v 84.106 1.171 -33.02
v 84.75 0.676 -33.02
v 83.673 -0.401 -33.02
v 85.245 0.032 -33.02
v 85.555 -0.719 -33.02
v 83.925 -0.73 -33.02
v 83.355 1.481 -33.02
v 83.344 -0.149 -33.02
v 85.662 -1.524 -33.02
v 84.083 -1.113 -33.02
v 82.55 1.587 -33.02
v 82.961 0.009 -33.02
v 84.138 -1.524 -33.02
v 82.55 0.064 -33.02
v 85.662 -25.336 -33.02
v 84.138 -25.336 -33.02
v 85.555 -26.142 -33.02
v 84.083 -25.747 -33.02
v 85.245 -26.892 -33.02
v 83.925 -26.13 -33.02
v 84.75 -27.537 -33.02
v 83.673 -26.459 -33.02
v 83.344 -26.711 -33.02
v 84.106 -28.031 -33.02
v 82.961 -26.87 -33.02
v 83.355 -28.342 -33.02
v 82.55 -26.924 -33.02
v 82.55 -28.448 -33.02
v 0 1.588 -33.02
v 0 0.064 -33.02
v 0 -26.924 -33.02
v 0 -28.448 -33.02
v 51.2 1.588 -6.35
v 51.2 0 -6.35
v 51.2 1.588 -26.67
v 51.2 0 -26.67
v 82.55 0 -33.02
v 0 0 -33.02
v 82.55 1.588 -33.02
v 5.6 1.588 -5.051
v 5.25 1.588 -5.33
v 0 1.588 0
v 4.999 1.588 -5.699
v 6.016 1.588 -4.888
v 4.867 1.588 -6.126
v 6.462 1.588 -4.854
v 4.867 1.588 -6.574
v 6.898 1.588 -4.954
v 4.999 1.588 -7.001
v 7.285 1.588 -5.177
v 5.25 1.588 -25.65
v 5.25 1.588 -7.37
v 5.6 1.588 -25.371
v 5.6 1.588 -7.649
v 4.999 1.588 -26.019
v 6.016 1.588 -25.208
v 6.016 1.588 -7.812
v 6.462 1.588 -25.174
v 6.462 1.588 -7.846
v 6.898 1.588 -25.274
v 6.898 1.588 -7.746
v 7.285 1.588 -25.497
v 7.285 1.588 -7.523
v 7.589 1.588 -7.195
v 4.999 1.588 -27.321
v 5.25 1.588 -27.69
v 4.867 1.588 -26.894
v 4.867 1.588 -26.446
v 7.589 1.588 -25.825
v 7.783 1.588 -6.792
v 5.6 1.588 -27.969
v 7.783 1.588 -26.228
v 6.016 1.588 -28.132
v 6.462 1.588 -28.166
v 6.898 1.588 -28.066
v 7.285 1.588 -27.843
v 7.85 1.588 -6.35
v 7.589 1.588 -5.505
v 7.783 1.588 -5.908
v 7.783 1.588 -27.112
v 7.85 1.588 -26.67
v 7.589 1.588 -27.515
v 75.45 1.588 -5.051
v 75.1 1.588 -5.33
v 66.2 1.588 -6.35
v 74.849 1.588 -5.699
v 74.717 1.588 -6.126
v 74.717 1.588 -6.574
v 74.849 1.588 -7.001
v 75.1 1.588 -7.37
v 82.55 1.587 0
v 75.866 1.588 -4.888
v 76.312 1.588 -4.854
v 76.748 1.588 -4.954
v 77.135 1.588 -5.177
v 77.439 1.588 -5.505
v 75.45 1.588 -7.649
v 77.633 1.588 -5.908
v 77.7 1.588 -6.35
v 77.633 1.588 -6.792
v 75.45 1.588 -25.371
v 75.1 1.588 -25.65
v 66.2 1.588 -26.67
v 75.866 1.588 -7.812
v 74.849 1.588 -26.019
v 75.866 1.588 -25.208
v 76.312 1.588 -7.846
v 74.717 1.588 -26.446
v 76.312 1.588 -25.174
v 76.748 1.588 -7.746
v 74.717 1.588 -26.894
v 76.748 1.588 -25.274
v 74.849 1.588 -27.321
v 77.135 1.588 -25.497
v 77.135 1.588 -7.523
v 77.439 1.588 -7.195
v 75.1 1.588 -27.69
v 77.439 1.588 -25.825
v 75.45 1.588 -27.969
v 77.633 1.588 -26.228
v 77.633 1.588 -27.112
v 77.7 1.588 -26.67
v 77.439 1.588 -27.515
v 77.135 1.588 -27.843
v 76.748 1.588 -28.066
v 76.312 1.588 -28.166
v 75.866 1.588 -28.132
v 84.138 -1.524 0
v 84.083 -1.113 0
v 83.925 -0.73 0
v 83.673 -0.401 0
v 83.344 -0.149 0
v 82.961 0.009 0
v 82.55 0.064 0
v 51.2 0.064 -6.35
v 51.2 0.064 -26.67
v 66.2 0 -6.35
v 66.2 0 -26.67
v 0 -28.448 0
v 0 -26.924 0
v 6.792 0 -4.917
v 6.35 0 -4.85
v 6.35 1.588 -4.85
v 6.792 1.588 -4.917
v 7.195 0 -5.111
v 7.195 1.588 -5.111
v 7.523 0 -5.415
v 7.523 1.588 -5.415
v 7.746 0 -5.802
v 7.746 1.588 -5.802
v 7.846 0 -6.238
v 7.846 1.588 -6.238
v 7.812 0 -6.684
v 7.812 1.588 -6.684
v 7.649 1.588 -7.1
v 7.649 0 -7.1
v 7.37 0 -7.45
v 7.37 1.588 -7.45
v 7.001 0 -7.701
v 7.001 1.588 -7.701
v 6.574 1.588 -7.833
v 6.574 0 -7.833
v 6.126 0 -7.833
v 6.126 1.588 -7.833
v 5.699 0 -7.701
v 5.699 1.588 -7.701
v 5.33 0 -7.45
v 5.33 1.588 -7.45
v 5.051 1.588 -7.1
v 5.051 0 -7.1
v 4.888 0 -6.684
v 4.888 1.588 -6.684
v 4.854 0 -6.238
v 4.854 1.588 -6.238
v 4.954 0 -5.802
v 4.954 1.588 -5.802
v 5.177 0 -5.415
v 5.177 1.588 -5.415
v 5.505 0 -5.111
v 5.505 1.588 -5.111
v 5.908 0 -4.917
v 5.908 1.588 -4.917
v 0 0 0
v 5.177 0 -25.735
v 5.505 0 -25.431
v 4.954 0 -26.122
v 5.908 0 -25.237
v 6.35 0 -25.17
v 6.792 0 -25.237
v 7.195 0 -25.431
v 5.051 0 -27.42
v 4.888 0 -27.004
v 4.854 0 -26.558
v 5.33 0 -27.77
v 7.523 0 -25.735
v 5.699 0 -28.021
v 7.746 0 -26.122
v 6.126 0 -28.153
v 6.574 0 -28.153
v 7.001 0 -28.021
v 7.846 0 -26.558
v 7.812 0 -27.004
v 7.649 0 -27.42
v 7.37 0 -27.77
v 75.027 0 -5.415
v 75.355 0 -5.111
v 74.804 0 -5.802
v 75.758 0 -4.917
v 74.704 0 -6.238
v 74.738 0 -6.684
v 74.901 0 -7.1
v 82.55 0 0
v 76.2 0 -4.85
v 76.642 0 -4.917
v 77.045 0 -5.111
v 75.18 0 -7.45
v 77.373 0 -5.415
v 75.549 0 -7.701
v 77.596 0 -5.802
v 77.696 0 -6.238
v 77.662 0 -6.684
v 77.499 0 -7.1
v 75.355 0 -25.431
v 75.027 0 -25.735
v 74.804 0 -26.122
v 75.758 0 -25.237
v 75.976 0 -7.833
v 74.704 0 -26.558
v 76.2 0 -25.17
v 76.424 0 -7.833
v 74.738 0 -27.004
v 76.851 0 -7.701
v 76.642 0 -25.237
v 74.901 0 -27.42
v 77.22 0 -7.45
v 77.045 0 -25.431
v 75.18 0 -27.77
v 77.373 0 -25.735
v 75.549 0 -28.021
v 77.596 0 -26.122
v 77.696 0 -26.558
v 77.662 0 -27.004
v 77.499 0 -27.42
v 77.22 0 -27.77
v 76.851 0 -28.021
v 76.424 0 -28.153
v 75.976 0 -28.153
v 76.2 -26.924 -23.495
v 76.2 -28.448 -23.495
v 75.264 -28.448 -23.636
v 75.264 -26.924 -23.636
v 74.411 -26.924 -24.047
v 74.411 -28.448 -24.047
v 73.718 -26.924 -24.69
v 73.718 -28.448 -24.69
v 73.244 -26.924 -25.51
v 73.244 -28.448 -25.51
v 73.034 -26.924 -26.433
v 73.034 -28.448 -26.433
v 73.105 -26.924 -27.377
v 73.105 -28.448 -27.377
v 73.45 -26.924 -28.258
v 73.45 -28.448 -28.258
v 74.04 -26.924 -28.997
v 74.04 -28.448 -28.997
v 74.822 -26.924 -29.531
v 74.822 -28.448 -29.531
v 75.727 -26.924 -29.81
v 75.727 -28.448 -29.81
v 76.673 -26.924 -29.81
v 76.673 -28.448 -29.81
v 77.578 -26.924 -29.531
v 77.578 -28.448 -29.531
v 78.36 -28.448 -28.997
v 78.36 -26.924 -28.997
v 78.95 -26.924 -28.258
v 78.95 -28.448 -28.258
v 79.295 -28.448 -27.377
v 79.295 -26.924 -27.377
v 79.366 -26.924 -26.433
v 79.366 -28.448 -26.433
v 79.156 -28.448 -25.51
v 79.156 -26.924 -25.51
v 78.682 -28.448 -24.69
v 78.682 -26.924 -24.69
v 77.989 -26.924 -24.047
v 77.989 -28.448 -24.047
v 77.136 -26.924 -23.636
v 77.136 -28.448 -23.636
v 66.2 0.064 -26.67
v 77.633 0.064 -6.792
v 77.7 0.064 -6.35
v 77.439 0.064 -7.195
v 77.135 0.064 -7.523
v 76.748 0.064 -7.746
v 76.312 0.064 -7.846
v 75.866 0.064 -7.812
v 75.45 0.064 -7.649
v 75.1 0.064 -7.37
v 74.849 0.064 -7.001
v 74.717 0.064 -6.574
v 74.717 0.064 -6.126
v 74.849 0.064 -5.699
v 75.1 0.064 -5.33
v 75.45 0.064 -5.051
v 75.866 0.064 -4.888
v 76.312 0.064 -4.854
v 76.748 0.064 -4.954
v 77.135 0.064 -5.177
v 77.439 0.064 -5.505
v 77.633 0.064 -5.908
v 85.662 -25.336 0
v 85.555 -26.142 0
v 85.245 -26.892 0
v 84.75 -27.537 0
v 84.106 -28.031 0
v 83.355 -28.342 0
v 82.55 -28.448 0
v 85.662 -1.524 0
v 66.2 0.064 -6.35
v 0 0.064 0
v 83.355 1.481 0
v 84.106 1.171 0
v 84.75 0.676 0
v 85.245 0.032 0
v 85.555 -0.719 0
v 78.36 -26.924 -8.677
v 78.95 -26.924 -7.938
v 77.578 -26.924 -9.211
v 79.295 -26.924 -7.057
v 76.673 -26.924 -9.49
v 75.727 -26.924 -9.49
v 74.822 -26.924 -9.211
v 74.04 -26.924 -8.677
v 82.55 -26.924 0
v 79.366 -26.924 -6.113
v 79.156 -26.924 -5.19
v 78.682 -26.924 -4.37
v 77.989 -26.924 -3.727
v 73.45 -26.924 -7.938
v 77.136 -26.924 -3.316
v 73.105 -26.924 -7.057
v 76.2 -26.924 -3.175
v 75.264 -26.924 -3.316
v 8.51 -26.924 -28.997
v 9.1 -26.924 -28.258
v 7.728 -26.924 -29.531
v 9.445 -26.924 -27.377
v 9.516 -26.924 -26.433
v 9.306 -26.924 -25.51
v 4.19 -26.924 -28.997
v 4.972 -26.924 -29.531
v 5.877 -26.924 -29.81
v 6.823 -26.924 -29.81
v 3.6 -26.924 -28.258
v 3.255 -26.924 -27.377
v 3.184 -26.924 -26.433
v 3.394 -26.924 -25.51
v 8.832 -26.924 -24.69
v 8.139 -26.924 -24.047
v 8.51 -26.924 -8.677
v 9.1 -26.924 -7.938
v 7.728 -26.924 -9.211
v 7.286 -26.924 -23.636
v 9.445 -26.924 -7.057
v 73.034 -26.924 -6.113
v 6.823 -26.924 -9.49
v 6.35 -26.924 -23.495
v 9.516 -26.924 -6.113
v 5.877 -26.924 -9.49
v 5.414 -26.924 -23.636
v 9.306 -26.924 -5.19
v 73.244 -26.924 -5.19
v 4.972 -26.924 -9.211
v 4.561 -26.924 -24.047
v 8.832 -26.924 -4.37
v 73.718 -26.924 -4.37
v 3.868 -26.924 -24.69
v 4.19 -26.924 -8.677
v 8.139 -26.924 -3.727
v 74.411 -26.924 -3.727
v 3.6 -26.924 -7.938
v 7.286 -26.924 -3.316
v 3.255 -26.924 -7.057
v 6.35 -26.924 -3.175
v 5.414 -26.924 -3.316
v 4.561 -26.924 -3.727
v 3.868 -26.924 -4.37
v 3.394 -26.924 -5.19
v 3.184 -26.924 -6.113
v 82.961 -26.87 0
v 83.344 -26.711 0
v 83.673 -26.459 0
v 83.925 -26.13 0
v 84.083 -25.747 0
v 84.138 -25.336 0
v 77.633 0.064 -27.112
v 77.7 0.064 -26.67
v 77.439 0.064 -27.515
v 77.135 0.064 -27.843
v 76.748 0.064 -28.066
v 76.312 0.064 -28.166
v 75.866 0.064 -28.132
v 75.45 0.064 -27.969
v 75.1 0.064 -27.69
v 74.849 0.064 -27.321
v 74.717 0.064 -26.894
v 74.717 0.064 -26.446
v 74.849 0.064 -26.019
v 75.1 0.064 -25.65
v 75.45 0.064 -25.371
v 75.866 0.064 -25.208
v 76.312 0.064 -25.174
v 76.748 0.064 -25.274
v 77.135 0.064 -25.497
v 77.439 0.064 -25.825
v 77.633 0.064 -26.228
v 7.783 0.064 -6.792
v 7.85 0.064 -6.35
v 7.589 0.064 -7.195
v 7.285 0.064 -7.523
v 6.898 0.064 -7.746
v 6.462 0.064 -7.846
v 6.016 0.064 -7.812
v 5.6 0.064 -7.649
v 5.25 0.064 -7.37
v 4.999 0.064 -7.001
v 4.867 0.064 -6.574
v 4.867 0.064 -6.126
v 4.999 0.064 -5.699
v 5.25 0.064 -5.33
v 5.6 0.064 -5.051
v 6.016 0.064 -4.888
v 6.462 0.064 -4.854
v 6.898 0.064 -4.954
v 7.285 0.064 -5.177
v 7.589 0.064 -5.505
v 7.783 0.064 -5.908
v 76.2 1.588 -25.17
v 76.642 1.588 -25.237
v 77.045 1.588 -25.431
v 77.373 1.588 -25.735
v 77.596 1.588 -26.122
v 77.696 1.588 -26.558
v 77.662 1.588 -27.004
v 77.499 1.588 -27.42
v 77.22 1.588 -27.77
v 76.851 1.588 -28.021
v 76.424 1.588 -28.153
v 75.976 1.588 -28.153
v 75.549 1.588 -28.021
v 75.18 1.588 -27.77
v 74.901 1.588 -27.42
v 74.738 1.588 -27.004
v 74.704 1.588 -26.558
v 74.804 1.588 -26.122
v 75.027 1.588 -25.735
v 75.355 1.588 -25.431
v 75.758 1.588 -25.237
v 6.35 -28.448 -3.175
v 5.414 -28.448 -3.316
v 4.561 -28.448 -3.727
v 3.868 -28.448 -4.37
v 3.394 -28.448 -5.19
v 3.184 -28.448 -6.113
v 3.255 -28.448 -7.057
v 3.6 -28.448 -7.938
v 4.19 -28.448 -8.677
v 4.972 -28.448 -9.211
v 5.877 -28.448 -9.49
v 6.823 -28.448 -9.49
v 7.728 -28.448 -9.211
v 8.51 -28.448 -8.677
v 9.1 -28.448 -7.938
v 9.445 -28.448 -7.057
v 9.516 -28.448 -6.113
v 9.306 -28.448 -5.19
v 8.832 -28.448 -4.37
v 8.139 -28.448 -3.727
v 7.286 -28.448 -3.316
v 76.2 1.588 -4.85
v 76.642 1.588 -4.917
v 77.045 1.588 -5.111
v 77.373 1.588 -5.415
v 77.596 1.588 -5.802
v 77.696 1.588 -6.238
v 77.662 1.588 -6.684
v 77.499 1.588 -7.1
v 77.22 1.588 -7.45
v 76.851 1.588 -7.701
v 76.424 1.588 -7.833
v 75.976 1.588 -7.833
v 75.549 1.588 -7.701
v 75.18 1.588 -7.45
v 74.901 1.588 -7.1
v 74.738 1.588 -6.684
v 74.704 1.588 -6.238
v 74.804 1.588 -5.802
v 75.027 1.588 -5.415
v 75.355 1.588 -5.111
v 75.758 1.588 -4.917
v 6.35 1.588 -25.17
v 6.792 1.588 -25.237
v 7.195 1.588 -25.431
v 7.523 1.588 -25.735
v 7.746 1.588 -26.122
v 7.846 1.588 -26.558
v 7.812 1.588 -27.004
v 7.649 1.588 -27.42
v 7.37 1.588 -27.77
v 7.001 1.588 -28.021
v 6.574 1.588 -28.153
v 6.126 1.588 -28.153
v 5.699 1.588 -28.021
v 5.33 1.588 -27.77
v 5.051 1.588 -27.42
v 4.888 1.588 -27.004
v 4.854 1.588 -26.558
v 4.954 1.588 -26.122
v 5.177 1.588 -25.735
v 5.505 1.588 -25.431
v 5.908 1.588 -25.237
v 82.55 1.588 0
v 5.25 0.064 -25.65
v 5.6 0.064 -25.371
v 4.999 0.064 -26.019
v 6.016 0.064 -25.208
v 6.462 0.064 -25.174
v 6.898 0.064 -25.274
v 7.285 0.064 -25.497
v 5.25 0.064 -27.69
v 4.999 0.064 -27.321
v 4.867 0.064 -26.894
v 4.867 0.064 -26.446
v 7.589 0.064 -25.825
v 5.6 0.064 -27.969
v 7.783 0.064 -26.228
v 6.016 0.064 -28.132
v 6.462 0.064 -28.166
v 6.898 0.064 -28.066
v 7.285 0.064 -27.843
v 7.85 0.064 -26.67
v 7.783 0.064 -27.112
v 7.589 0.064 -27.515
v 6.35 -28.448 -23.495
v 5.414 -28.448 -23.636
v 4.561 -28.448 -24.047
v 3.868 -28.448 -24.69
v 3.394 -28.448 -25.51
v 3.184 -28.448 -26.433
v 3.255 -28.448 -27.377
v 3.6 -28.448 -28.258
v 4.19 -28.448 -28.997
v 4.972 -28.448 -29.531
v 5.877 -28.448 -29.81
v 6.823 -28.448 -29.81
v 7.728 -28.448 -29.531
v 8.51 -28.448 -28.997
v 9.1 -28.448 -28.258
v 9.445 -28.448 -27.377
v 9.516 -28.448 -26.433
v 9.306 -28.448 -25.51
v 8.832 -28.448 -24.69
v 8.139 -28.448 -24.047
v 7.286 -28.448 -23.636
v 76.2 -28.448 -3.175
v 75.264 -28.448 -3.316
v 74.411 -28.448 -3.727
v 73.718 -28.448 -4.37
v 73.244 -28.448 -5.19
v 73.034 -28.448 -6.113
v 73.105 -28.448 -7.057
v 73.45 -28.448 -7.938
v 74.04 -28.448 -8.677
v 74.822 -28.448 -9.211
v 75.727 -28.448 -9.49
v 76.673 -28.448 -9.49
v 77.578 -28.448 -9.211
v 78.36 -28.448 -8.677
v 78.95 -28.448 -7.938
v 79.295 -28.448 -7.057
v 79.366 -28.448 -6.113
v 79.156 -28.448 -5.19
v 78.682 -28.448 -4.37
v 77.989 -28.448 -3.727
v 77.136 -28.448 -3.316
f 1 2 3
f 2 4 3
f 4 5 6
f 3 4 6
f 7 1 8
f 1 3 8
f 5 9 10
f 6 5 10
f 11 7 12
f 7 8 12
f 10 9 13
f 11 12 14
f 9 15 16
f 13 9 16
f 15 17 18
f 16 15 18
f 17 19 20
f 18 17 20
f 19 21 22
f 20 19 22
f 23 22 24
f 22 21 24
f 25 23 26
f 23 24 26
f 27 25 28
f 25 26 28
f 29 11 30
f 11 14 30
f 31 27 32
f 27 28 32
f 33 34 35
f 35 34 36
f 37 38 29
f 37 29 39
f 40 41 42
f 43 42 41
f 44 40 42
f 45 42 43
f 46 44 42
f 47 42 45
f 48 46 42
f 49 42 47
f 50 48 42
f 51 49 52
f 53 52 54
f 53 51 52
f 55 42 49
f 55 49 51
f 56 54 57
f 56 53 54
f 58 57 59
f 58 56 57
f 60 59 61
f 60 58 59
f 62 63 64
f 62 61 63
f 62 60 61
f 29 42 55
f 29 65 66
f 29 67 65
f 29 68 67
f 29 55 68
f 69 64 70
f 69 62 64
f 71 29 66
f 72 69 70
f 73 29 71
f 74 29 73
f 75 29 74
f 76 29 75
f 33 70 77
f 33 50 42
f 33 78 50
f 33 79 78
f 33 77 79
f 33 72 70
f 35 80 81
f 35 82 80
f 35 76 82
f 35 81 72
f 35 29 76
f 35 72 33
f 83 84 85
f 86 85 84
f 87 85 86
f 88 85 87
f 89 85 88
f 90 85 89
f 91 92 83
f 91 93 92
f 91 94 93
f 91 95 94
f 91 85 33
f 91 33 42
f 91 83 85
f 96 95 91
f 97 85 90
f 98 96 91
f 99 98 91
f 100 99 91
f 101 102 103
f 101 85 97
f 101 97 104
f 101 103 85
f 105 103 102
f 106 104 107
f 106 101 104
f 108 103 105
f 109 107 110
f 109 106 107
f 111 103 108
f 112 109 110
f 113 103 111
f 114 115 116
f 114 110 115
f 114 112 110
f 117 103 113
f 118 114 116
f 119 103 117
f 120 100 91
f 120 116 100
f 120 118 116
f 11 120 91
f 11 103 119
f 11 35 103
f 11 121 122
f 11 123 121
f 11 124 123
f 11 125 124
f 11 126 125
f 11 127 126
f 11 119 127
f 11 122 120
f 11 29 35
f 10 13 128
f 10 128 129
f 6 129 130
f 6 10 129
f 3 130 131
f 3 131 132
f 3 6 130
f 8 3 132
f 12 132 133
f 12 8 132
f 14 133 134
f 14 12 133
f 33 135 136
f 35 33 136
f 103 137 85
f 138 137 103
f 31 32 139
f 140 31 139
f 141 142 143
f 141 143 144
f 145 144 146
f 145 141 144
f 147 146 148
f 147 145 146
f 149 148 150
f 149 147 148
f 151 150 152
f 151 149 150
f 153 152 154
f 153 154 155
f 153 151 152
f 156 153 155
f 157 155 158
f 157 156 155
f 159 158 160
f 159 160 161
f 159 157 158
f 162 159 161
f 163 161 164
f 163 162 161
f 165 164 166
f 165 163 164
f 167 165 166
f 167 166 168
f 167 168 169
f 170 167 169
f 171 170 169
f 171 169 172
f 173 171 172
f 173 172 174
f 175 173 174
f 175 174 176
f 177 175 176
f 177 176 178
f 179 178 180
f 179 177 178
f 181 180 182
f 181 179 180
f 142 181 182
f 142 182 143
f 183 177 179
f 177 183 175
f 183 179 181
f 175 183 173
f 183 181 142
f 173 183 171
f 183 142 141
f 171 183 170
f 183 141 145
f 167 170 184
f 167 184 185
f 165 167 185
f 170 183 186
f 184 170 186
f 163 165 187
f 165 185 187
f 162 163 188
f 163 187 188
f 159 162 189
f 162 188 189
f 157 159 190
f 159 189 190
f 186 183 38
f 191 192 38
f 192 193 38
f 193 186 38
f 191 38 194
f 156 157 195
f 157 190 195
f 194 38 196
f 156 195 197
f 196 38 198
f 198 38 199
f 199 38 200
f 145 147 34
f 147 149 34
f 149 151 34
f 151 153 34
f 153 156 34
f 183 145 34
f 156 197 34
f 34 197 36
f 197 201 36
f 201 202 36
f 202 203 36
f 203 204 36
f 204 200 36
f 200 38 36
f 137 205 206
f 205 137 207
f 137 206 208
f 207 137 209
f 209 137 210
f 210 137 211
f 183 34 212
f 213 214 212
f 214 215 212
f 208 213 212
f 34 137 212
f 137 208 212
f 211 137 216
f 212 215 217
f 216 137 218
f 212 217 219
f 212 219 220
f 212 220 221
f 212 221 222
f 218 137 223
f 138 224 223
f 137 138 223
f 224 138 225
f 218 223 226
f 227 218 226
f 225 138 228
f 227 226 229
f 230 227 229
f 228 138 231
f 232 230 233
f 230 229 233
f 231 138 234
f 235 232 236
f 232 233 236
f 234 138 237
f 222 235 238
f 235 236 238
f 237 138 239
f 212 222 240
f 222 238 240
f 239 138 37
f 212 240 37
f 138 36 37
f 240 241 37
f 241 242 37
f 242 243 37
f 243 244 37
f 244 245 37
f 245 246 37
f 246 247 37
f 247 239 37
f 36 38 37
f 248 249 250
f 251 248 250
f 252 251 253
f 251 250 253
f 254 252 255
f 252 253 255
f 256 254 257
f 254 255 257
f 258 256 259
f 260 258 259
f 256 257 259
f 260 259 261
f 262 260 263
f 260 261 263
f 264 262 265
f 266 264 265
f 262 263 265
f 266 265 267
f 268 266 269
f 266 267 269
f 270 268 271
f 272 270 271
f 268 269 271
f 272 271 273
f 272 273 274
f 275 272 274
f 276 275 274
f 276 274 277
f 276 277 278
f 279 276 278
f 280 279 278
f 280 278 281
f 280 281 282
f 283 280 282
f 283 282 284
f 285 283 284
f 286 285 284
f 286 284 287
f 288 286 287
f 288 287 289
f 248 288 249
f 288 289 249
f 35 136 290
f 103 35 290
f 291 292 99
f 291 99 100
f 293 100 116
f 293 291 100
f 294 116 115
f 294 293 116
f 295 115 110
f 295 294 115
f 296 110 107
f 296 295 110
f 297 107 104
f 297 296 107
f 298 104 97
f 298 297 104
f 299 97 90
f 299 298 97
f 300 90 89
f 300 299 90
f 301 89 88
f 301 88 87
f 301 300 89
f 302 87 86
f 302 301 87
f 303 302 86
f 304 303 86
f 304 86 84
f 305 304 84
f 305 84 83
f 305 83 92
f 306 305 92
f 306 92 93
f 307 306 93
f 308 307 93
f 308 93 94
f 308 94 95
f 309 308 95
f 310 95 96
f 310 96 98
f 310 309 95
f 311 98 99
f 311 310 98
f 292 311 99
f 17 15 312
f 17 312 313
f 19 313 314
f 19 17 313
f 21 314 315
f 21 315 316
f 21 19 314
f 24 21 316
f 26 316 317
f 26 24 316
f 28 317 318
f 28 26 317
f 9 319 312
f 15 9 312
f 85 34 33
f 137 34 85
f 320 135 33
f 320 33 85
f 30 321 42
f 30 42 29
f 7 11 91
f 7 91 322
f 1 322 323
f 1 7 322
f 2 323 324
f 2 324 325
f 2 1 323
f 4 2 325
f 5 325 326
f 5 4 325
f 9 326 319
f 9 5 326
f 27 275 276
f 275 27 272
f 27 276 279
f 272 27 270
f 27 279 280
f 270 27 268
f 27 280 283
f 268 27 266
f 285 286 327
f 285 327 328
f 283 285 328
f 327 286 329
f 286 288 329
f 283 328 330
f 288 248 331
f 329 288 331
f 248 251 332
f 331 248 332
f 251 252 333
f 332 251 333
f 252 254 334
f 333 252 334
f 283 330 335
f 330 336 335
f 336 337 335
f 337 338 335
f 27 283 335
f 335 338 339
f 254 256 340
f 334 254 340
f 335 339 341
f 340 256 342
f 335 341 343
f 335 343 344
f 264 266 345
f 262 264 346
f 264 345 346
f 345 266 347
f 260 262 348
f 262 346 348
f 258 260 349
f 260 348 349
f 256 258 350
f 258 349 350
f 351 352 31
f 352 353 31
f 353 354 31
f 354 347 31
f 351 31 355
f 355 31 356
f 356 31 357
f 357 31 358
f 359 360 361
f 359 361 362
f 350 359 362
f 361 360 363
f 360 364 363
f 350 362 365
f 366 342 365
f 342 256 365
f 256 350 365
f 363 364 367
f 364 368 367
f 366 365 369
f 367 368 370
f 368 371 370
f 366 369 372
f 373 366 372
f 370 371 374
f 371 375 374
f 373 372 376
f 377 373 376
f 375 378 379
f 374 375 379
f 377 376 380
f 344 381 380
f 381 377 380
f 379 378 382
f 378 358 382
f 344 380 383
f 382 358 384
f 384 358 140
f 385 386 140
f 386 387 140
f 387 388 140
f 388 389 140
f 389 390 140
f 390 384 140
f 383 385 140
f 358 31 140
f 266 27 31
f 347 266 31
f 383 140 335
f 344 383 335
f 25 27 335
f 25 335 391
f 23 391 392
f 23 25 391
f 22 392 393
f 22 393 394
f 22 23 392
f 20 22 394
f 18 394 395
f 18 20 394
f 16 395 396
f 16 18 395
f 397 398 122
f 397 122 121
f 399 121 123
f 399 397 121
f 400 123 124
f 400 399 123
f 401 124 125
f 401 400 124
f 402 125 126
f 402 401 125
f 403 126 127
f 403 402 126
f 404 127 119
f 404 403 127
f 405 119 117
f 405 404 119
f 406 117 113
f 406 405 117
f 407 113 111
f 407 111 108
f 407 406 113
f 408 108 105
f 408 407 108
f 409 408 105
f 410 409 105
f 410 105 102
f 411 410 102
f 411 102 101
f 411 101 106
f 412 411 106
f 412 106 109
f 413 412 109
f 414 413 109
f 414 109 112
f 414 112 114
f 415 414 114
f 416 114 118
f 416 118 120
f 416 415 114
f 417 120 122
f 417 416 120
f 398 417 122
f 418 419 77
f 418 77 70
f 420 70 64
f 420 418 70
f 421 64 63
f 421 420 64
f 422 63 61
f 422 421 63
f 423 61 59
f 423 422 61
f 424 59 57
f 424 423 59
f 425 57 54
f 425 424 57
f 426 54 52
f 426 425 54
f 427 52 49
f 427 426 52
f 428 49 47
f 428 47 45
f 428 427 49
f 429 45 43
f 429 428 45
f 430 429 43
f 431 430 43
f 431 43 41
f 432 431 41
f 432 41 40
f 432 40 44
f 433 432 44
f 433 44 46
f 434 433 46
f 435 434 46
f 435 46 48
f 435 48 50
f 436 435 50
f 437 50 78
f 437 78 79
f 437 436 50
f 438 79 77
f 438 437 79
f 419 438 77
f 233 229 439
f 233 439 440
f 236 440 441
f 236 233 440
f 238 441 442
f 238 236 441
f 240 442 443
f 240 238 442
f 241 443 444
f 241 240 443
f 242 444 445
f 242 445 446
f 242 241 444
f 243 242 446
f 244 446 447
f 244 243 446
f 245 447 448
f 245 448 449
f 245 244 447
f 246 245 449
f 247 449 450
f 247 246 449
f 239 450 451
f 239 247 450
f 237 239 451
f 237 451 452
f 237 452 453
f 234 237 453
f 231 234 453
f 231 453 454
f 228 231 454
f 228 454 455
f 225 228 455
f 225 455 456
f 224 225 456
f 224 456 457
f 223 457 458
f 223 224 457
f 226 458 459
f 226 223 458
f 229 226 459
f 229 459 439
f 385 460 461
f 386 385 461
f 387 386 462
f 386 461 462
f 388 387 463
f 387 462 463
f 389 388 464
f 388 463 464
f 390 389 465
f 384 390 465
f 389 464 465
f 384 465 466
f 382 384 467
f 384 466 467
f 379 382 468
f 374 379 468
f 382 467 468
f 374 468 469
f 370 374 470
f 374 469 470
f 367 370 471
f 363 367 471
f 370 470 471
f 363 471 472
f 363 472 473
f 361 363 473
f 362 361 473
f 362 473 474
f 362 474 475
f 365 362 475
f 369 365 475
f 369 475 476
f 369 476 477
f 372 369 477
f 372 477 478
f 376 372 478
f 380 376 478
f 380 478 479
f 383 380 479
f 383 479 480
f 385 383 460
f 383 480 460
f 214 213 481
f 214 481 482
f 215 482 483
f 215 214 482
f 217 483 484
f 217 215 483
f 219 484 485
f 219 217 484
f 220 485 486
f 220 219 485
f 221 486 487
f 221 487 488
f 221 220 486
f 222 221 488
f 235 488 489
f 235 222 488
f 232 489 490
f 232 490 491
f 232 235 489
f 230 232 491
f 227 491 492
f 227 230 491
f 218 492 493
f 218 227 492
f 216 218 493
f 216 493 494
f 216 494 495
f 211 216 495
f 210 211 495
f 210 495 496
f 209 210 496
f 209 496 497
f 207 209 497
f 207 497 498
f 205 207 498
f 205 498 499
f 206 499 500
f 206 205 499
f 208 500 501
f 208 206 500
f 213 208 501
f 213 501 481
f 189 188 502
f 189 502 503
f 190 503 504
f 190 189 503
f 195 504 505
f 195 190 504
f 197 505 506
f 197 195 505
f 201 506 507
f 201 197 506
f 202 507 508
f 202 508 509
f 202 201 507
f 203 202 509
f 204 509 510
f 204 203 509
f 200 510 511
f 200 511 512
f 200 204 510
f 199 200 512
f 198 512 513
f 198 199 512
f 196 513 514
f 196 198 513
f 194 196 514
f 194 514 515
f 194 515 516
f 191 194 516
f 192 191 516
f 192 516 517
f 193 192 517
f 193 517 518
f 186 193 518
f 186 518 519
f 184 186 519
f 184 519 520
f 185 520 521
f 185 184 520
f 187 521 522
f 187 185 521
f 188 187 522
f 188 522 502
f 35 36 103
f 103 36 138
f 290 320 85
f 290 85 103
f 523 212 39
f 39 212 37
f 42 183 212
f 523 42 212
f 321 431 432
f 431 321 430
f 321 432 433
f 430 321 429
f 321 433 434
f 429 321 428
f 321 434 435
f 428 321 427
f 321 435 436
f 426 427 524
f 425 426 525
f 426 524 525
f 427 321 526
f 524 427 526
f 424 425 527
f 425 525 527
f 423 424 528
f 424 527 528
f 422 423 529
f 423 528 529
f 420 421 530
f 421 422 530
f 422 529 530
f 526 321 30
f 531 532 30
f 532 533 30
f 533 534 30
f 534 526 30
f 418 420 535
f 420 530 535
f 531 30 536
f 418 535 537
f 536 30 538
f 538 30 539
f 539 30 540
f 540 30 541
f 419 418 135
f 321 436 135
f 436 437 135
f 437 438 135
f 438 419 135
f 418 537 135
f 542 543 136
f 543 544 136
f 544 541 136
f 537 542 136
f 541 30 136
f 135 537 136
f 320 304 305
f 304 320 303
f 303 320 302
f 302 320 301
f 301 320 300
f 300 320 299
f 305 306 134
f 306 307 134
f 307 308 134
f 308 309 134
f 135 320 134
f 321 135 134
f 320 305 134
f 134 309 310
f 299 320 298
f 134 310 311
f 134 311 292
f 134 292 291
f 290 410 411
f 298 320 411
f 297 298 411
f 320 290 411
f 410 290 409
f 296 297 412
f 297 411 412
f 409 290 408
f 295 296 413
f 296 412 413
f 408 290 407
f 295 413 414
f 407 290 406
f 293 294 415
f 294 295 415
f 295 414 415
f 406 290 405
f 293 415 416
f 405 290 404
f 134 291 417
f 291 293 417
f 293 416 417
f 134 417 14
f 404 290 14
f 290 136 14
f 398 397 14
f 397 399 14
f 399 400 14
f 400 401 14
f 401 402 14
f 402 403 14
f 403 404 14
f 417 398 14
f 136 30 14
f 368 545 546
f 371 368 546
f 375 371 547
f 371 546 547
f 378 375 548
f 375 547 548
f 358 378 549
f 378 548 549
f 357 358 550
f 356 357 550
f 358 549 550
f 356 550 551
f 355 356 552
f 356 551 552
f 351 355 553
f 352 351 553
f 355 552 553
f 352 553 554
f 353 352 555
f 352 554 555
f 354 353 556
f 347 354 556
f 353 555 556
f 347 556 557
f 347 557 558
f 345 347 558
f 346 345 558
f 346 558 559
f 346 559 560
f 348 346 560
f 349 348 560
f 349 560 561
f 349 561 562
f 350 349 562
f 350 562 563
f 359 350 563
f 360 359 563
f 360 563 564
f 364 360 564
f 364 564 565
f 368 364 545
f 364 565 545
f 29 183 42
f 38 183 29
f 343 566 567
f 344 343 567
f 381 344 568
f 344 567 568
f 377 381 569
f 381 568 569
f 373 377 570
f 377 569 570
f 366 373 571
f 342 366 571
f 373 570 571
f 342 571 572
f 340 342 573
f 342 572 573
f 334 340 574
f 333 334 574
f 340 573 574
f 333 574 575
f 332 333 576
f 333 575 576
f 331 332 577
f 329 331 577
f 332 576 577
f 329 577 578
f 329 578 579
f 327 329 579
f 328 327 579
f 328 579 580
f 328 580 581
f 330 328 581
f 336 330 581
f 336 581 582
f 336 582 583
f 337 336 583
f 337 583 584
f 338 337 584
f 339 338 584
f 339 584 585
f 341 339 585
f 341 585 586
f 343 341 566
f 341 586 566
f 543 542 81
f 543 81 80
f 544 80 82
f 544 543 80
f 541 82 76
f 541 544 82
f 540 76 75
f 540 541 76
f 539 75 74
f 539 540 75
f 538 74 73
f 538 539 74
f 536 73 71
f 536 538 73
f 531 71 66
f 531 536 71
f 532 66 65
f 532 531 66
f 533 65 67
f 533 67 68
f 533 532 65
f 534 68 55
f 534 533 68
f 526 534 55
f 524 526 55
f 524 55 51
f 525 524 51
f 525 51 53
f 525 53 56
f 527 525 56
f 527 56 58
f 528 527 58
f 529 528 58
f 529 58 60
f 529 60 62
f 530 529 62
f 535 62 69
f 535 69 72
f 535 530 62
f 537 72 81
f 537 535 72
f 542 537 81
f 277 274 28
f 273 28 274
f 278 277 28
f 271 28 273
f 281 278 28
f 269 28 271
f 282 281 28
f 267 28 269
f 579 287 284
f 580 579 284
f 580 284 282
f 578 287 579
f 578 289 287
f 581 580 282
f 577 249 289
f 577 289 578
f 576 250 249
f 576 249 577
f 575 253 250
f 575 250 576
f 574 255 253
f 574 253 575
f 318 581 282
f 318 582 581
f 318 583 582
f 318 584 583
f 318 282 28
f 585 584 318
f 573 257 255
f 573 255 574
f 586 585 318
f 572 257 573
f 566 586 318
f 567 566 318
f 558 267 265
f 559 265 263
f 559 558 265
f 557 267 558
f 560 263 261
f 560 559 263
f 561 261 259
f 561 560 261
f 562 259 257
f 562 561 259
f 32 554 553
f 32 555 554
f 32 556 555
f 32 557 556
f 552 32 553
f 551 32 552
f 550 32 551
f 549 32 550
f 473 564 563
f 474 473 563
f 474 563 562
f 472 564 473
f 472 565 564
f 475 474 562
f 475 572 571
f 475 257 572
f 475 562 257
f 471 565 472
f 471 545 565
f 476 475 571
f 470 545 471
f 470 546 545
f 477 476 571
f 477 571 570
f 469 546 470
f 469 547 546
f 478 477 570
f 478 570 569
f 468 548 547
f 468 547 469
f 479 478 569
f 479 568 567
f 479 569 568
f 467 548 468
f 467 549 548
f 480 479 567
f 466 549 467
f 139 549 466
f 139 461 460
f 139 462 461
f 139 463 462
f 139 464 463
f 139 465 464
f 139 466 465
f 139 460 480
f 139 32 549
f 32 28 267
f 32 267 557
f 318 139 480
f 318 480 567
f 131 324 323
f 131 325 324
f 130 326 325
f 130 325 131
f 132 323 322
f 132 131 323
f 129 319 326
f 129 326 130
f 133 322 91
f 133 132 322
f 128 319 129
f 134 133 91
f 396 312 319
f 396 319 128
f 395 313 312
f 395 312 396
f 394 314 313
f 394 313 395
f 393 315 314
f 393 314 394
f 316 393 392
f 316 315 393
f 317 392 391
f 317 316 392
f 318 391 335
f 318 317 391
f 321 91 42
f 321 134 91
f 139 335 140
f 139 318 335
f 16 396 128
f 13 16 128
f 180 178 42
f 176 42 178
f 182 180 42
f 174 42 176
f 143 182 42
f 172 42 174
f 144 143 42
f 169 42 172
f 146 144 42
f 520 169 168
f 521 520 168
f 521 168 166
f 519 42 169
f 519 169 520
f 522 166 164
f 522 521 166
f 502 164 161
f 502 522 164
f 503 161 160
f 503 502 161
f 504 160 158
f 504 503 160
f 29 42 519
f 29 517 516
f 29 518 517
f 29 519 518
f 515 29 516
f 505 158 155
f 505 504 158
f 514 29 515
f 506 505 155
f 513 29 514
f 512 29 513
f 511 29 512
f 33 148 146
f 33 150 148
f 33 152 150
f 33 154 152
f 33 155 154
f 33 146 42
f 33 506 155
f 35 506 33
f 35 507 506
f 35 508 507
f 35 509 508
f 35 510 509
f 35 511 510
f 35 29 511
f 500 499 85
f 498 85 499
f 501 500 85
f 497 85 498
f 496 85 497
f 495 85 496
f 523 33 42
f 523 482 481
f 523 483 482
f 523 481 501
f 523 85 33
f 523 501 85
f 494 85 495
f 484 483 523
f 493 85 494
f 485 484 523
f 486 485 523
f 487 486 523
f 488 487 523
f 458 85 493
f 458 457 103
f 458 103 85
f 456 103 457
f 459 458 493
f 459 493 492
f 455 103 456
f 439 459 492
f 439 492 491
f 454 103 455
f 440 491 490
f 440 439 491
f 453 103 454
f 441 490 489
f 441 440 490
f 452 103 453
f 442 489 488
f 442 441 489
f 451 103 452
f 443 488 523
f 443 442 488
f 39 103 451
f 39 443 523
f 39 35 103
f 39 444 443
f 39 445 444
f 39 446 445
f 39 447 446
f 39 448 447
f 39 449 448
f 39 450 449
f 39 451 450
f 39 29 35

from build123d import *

# Parameters (mm, degrees)
ESQUISSE1_W                      = 82.55
ESQUISSE1_H                      = 33.02
ESQUISSE1_R                      = 1.5
ESQUISSE1_W_2                    = 15
ESQUISSE1_H_2                    = 20.32
BOSS_EXTRU_1_DEPTH               = 1.5875
CONVERTIR_VOLUME1_START          = 0.0635
CONVERTIR_VOLUME1_OUTLINE_W      = 82.55
CONVERTIR_VOLUME1_OUTLINE_H      = 33.02
CONVERTIR_VOLUME1_OUTLINE_R      = 1.5
CONVERTIR_VOLUME1_OUTLINE_W_2    = 15
CONVERTIR_VOLUME1_OUTLINE_H_2    = 20.32
CONVERTIR_VOLUME1_DEPTH          = 1.524
T_LE_PLI_E_SUR_AR_TE3_DEPTH      = 33.02
T_LE_PLI_E_SUR_AR_TE4_DEPTH      = 33.02
T_LE_START                       = 1.524
T_LE_PLI_E_SUR_AR_TE4_PROFILE_W  = 33.02
T_LE_PLI_E_SUR_AR_TE4_PROFILE_H  = 82.55
T_LE_PLI_E_SUR_AR_TE4_PROFILE_R  = 3.175
T_LE_PLI_E_SUR_AR_TE4_FLAT_DEPTH = 1.524


# Read off the part's stored shape, not the designer's step: Convertir-Volume1
# Sheet-metal steps are written as plain solids
with BuildPart() as part:
    # Esquisse1 → Boss.-Extru.1 (new body)
    with BuildSketch(Plane(origin=(0, 0, 0), x_dir=(1, 0, 0), z_dir=(0, 1, 0))):
        with Locations((41.275, 16.51)):
            Rectangle(ESQUISSE1_W, ESQUISSE1_H)
        with Locations(Location((6.35, 26.67, 0), (0, 0, 270))):
            Circle(ESQUISSE1_R, mode=Mode.SUBTRACT)
        with Locations(Location((76.2, 26.67, 0), (0, 0, 270))):
            Circle(ESQUISSE1_R, mode=Mode.SUBTRACT)
        with Locations(Location((76.2, 6.349999837, 0), (0, 0, 270))):
            Circle(ESQUISSE1_R, mode=Mode.SUBTRACT)
        with Locations(Location((6.35, 6.349999837, 0), (0, 0, 270))):
            Circle(ESQUISSE1_R, mode=Mode.SUBTRACT)
        with Locations((58.7, 16.51)):
            Rectangle(ESQUISSE1_W_2, ESQUISSE1_H_2, mode=Mode.SUBTRACT)
    extrude(amount=BOSS_EXTRU_1_DEPTH)


with BuildPart() as body_2:
    # Convertir-Volume1 outline → Convertir-Volume1 (new body)
    with BuildSketch(Plane(origin=(0, 0, 0), x_dir=(1, 0, 0), z_dir=(0, 1, 0)).offset(CONVERTIR_VOLUME1_START)):
        with Locations((41.275, 16.51)):
            Rectangle(CONVERTIR_VOLUME1_OUTLINE_W, CONVERTIR_VOLUME1_OUTLINE_H)
        with Locations((6.35, 6.349999837)):
            Circle(CONVERTIR_VOLUME1_OUTLINE_R, mode=Mode.SUBTRACT)
        with Locations((76.2, 6.349999837)):
            Circle(CONVERTIR_VOLUME1_OUTLINE_R, mode=Mode.SUBTRACT)
        with Locations((6.35, 26.67)):
            Circle(CONVERTIR_VOLUME1_OUTLINE_R, mode=Mode.SUBTRACT)
        with Locations((58.7, 16.51)):
            Rectangle(CONVERTIR_VOLUME1_OUTLINE_W_2, CONVERTIR_VOLUME1_OUTLINE_H_2, mode=Mode.SUBTRACT)
        with Locations((76.2, 26.67)):
            Circle(CONVERTIR_VOLUME1_OUTLINE_R, mode=Mode.SUBTRACT)
    extrude(amount=CONVERTIR_VOLUME1_DEPTH)

    # Tôle pliée sur arête3 section (across the edge) → Tôle pliée sur arête3 (add)
    with BuildSketch(Plane(origin=(84.1375, 0.0635, -33.02), x_dir=(-1, 0, 0), z_dir=(0, 0, 1))):
        with BuildLine():
            Line((-1.524, 1.5875), (-1.524, 25.4))
            Line((-1.524, 25.4), (0, 25.4))
            Line((0, 25.4), (0, 1.5875))
            ThreePointArc((0, 1.5875), (0.464967985, 0.464967985), (1.5875, 0))
            Line((1.5875, 0), (1.5875, -1.524))
            ThreePointArc((1.5875, -1.524), (-0.61266275, -0.61266275), (-1.524, 1.5875))
        make_face()
    extrude(amount=T_LE_PLI_E_SUR_AR_TE3_DEPTH)

    # Tôle pliée sur arête4 bend section (across the edge) → Tôle pliée sur arête4 (add)
    with BuildSketch(Plane(origin=(84.1375, -26.924, -33.02), x_dir=(0, 1, 0), z_dir=(0, 0, 1))):
        with BuildLine():
            Line((-1.524, 1.5875), (0, 1.5875))
            ThreePointArc((0, 1.5875), (0.464967985, 0.464967985), (1.5875, 0))
            Line((1.5875, 0), (1.5875, -1.524))
            ThreePointArc((1.5875, -1.524), (-0.61266275, -0.61266275), (-1.524, 1.5875))
        make_face()
    extrude(amount=T_LE_PLI_E_SUR_AR_TE4_DEPTH)

    # Tôle pliée sur arête4 profile (on flange) → Tôle pliée sur arête4 flat (add)
    with BuildSketch(Plane(origin=(84.1375, -26.924, 0), x_dir=(0, 0, 1), z_dir=(0, -1, 0)).offset(T_LE_START)):
        with Locations((-16.51, 42.8625)):
            Rectangle(T_LE_PLI_E_SUR_AR_TE4_PROFILE_W, T_LE_PLI_E_SUR_AR_TE4_PROFILE_H)
        with Locations((-26.67, 7.9375)):
            Circle(T_LE_PLI_E_SUR_AR_TE4_PROFILE_R, mode=Mode.SUBTRACT)
        with Locations((-6.35, 7.9375)):
            Circle(T_LE_PLI_E_SUR_AR_TE4_PROFILE_R, mode=Mode.SUBTRACT)
        with Locations((-26.67, 77.7875)):
            Circle(T_LE_PLI_E_SUR_AR_TE4_PROFILE_R, mode=Mode.SUBTRACT)
        with Locations((-6.35, 77.7875)):
            Circle(T_LE_PLI_E_SUR_AR_TE4_PROFILE_R, mode=Mode.SUBTRACT)
    extrude(amount=-T_LE_PLI_E_SUR_AR_TE4_FLAT_DEPTH)


solid = Compound([part.part, body_2.part])
